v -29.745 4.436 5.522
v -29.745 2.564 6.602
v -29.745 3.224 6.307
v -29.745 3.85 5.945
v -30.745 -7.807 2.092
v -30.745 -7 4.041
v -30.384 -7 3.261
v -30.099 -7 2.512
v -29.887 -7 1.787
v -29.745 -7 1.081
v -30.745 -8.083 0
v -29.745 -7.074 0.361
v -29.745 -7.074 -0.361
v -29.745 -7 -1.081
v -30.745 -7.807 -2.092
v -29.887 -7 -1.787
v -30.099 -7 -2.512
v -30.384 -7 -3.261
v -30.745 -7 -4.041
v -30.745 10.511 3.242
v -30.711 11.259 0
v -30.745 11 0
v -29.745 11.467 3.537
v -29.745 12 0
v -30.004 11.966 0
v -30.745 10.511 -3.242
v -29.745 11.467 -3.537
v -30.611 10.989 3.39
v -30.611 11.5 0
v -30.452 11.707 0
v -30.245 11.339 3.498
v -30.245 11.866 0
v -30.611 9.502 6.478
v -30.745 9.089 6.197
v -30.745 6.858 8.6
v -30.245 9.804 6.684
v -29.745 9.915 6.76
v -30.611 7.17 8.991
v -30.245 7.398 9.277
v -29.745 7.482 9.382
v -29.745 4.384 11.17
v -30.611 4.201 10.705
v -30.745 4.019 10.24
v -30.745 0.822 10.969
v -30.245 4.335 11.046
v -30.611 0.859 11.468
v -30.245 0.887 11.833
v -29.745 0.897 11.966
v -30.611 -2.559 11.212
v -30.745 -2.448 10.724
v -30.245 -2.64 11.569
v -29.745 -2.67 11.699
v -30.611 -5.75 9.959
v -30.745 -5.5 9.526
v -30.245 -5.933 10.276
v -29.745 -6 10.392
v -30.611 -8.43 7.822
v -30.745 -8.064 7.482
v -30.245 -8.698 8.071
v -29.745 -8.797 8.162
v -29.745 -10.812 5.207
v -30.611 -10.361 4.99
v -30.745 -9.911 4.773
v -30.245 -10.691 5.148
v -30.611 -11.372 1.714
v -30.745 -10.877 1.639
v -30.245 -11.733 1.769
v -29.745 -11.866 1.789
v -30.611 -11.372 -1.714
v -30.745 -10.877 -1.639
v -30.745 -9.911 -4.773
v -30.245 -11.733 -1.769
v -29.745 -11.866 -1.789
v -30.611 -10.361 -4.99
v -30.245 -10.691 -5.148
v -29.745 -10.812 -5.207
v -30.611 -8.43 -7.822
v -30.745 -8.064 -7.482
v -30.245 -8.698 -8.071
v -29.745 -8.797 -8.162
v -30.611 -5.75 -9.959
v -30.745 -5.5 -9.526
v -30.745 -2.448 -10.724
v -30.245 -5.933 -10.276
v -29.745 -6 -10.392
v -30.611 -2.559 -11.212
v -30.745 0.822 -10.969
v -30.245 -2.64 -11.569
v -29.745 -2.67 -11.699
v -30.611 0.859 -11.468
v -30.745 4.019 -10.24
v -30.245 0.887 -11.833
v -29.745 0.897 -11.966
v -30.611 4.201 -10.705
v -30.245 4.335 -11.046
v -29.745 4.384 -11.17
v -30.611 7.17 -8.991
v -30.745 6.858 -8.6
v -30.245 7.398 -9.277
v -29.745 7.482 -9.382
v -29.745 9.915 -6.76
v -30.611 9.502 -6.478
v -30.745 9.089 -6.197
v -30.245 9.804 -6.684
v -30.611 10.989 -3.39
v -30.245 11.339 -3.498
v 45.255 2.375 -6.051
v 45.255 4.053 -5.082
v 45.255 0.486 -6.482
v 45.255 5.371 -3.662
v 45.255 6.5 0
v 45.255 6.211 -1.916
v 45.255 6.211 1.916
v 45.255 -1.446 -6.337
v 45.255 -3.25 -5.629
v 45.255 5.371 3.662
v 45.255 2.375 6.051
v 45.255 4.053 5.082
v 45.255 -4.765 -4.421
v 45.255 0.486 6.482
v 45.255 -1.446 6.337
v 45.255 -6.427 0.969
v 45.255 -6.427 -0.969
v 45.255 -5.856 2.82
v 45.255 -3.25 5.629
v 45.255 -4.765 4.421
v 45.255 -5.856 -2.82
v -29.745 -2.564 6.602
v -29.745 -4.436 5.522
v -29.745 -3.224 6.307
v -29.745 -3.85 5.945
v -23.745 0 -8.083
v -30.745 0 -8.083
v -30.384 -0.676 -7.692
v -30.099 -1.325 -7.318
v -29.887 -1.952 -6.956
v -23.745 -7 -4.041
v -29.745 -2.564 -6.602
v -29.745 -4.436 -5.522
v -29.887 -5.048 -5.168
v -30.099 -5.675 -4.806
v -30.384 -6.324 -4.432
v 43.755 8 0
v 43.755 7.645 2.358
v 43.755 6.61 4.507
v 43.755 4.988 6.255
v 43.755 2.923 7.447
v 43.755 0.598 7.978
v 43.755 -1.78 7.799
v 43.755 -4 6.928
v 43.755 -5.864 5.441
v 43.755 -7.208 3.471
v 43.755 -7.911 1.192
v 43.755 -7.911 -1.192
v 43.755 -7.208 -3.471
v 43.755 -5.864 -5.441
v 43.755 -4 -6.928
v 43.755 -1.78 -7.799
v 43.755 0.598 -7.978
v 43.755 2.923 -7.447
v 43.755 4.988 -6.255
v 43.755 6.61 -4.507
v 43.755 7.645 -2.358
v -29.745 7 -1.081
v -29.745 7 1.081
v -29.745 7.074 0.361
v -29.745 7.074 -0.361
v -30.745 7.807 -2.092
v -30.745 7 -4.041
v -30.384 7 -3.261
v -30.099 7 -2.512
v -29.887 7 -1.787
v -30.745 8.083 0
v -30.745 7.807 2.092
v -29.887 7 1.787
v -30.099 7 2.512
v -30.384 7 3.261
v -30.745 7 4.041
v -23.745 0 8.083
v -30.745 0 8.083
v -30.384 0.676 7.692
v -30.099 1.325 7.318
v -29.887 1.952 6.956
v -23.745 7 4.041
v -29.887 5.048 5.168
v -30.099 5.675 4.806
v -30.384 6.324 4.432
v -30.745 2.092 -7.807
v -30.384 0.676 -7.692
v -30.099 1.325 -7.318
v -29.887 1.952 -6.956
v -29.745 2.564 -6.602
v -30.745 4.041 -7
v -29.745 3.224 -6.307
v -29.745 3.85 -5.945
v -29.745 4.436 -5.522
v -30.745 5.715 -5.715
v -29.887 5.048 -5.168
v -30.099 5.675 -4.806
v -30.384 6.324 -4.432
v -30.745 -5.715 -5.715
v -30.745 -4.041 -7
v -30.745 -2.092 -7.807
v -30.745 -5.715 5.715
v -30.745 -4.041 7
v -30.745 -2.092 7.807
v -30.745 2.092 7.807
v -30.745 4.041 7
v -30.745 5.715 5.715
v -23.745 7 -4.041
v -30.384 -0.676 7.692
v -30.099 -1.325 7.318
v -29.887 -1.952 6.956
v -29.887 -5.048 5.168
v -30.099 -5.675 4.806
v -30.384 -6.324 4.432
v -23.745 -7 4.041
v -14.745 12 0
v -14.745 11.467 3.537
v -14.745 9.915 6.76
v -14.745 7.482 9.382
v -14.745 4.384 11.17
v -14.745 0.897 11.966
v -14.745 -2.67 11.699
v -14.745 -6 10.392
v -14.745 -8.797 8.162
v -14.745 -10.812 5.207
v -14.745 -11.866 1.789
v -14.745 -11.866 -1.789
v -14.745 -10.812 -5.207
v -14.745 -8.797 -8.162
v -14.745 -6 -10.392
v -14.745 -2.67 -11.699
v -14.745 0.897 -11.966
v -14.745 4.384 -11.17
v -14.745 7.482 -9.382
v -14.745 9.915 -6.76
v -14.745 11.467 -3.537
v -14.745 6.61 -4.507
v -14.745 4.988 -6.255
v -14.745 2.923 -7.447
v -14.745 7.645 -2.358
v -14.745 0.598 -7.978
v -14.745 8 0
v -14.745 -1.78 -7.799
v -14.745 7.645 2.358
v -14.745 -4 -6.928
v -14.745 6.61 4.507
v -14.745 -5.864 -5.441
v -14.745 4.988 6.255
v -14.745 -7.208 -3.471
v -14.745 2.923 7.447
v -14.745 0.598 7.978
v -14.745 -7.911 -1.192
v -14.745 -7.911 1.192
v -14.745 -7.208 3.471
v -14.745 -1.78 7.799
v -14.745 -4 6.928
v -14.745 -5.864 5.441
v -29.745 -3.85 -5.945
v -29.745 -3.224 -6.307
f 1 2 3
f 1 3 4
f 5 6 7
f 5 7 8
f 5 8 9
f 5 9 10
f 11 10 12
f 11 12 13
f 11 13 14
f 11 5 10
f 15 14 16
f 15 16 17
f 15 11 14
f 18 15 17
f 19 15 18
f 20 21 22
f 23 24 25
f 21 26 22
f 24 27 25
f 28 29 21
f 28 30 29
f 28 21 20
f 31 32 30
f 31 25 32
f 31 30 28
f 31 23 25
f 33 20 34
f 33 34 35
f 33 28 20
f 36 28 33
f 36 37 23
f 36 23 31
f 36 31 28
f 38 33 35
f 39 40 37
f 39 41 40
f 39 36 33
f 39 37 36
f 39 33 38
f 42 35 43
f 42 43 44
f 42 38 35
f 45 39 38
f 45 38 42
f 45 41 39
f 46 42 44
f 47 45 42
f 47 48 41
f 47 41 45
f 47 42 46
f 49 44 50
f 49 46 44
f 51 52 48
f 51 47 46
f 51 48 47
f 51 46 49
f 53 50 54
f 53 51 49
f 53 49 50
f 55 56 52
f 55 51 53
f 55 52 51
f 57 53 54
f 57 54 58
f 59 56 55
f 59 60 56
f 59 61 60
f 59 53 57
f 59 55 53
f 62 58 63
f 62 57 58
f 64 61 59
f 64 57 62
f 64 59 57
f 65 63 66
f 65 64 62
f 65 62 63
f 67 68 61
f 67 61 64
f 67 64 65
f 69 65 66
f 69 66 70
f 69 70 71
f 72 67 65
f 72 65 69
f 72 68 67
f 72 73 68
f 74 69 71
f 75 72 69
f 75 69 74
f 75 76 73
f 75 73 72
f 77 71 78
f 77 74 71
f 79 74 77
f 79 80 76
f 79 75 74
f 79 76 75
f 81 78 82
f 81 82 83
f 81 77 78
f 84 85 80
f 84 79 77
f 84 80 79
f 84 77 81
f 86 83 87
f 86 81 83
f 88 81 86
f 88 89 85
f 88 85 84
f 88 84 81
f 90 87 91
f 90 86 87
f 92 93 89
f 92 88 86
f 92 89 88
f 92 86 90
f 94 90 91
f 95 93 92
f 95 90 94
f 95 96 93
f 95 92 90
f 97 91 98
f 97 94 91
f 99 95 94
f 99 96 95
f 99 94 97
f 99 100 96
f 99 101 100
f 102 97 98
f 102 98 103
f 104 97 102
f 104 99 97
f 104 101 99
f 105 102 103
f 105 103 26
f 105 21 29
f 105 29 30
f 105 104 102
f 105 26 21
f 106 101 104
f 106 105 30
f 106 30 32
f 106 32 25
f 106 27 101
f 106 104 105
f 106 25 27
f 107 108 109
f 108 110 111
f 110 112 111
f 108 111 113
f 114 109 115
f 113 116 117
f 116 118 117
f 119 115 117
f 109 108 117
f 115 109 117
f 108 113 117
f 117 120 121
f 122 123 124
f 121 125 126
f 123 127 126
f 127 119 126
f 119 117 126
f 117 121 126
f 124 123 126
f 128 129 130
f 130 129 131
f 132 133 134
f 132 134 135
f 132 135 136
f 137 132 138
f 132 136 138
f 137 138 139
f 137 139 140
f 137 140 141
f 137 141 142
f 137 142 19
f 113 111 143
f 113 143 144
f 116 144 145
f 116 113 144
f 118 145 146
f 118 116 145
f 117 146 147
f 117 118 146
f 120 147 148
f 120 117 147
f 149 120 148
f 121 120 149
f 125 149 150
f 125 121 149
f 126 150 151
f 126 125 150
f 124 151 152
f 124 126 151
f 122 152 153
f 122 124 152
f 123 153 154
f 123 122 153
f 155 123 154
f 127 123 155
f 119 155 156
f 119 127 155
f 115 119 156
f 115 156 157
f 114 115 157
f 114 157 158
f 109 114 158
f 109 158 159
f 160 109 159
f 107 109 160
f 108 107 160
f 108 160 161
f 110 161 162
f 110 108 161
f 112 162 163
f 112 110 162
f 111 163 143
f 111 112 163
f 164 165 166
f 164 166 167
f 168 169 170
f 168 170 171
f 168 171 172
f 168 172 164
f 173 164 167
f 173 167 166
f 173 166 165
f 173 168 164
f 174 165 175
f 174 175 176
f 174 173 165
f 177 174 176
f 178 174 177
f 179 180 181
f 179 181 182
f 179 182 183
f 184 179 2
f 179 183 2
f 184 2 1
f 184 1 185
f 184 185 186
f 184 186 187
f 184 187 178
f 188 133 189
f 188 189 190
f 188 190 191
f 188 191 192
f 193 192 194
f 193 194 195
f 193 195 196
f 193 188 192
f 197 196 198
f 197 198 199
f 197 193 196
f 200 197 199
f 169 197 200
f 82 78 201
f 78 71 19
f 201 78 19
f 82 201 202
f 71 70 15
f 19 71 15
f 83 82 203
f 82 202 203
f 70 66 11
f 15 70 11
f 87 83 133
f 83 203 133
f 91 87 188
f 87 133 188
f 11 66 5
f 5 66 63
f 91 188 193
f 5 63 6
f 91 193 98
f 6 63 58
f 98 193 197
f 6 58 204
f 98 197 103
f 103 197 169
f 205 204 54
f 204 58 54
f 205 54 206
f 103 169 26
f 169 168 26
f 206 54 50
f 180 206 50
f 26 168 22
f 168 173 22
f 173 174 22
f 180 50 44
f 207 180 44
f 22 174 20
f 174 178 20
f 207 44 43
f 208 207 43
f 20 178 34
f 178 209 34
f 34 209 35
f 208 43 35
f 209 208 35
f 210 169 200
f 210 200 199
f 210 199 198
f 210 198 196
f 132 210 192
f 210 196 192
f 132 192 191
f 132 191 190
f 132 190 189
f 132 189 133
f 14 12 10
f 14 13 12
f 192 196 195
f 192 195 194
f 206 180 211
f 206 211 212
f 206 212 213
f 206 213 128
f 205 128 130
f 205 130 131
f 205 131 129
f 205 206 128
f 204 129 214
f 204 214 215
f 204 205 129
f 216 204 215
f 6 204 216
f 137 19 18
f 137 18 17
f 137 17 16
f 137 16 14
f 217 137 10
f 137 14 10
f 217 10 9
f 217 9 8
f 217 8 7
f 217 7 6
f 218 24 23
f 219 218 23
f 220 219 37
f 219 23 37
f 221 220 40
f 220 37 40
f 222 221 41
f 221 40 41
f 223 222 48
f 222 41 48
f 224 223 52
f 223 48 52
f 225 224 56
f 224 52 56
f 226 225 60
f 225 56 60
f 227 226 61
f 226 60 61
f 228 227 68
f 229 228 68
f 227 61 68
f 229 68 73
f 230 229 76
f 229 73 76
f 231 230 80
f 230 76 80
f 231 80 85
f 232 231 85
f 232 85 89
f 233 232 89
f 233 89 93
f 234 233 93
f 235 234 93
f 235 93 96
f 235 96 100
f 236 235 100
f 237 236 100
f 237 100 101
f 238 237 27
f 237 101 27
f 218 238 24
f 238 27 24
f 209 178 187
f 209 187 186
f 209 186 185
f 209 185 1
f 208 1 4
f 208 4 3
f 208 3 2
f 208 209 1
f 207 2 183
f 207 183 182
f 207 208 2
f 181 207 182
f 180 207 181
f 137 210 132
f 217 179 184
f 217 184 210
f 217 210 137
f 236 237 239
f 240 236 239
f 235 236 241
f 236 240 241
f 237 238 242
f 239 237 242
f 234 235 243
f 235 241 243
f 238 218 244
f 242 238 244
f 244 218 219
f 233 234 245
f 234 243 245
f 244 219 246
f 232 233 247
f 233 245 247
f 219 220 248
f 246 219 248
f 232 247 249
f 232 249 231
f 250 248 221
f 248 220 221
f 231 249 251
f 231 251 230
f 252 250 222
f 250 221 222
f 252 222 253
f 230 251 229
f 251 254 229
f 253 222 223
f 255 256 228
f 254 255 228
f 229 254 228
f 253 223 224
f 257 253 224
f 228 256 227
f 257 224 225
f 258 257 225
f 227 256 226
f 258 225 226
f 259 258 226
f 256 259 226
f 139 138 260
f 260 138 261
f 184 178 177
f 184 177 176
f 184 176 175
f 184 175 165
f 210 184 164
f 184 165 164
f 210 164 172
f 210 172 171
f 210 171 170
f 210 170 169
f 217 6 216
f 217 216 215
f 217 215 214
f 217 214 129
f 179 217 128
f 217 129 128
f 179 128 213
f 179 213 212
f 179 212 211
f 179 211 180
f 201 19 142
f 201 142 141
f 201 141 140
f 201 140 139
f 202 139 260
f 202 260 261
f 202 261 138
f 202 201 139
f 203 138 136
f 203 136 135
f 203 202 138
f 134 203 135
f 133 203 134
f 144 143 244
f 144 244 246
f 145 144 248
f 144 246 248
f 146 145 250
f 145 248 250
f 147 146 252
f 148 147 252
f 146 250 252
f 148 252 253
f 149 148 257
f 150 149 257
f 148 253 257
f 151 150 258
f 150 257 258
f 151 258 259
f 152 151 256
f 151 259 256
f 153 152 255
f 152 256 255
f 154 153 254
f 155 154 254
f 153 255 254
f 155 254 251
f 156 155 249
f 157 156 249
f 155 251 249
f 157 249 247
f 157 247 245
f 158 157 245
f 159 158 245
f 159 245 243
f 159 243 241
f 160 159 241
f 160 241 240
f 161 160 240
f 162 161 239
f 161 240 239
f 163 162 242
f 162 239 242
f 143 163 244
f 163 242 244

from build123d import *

# Parameters (mm, degrees)
F2_R     = 1
F3_SIZE  = 1.5
F5_DEPTH = 7


with BuildPart() as f1:
    # F0 (on Top) → F1 (revolve)
    with BuildSketch(Plane.XY):
        Polygon((-30.745121, 12), (-30.745121, 0), (45.254879, 0), (45.254879, 8), (-14.745121, 8), (-14.745121, 12), align=None)
    revolve(axis=Axis((0.541581, 0, 0), (1, 0, 0)))

    # F2
    f2_edges = [f1.edges().sort_by_distance(p)[0] for p in [
        (-30.745121, -12, 0),
    ]]
    fillet(f2_edges, radius=F2_R)

    # F3
    f3_edges = [f1.edges().sort_by_distance(p)[0] for p in [
        (45.254879, -8, 0),
    ]]
    chamfer(f3_edges, length=F3_SIZE)

    # F4 (on face) → F5 (cut)
    with BuildSketch(Plane(origin=(-30.745121, 0, 0), x_dir=(0, -1, 0), z_dir=(-1, 0, 0))):
        Polygon((7, -4.041452), (7, 2.453793), (7, 4.041452), (0, 8.082904), (-7, 4.041452), (-7, 2.453793), (-7, -4.041452), (0, -8.082904), align=None)
    extrude(amount=-F5_DEPTH, mode=Mode.SUBTRACT)

    # F6 (on Front) → F7 (revolve, cut)
    with BuildSketch(Plane.XZ):
        Polygon((-29.745121, 7.082904), (-30.745121, 8.082904), (-30.745121, 0), (-29.745121, 0), align=None)
    revolve(axis=Axis((0.541581, 0, 0), (1, 0, 0)), mode=Mode.SUBTRACT)


with BuildPart() as f8_1:
    # F8: copy of F1
    add(f1.part)


solid = f1.part
